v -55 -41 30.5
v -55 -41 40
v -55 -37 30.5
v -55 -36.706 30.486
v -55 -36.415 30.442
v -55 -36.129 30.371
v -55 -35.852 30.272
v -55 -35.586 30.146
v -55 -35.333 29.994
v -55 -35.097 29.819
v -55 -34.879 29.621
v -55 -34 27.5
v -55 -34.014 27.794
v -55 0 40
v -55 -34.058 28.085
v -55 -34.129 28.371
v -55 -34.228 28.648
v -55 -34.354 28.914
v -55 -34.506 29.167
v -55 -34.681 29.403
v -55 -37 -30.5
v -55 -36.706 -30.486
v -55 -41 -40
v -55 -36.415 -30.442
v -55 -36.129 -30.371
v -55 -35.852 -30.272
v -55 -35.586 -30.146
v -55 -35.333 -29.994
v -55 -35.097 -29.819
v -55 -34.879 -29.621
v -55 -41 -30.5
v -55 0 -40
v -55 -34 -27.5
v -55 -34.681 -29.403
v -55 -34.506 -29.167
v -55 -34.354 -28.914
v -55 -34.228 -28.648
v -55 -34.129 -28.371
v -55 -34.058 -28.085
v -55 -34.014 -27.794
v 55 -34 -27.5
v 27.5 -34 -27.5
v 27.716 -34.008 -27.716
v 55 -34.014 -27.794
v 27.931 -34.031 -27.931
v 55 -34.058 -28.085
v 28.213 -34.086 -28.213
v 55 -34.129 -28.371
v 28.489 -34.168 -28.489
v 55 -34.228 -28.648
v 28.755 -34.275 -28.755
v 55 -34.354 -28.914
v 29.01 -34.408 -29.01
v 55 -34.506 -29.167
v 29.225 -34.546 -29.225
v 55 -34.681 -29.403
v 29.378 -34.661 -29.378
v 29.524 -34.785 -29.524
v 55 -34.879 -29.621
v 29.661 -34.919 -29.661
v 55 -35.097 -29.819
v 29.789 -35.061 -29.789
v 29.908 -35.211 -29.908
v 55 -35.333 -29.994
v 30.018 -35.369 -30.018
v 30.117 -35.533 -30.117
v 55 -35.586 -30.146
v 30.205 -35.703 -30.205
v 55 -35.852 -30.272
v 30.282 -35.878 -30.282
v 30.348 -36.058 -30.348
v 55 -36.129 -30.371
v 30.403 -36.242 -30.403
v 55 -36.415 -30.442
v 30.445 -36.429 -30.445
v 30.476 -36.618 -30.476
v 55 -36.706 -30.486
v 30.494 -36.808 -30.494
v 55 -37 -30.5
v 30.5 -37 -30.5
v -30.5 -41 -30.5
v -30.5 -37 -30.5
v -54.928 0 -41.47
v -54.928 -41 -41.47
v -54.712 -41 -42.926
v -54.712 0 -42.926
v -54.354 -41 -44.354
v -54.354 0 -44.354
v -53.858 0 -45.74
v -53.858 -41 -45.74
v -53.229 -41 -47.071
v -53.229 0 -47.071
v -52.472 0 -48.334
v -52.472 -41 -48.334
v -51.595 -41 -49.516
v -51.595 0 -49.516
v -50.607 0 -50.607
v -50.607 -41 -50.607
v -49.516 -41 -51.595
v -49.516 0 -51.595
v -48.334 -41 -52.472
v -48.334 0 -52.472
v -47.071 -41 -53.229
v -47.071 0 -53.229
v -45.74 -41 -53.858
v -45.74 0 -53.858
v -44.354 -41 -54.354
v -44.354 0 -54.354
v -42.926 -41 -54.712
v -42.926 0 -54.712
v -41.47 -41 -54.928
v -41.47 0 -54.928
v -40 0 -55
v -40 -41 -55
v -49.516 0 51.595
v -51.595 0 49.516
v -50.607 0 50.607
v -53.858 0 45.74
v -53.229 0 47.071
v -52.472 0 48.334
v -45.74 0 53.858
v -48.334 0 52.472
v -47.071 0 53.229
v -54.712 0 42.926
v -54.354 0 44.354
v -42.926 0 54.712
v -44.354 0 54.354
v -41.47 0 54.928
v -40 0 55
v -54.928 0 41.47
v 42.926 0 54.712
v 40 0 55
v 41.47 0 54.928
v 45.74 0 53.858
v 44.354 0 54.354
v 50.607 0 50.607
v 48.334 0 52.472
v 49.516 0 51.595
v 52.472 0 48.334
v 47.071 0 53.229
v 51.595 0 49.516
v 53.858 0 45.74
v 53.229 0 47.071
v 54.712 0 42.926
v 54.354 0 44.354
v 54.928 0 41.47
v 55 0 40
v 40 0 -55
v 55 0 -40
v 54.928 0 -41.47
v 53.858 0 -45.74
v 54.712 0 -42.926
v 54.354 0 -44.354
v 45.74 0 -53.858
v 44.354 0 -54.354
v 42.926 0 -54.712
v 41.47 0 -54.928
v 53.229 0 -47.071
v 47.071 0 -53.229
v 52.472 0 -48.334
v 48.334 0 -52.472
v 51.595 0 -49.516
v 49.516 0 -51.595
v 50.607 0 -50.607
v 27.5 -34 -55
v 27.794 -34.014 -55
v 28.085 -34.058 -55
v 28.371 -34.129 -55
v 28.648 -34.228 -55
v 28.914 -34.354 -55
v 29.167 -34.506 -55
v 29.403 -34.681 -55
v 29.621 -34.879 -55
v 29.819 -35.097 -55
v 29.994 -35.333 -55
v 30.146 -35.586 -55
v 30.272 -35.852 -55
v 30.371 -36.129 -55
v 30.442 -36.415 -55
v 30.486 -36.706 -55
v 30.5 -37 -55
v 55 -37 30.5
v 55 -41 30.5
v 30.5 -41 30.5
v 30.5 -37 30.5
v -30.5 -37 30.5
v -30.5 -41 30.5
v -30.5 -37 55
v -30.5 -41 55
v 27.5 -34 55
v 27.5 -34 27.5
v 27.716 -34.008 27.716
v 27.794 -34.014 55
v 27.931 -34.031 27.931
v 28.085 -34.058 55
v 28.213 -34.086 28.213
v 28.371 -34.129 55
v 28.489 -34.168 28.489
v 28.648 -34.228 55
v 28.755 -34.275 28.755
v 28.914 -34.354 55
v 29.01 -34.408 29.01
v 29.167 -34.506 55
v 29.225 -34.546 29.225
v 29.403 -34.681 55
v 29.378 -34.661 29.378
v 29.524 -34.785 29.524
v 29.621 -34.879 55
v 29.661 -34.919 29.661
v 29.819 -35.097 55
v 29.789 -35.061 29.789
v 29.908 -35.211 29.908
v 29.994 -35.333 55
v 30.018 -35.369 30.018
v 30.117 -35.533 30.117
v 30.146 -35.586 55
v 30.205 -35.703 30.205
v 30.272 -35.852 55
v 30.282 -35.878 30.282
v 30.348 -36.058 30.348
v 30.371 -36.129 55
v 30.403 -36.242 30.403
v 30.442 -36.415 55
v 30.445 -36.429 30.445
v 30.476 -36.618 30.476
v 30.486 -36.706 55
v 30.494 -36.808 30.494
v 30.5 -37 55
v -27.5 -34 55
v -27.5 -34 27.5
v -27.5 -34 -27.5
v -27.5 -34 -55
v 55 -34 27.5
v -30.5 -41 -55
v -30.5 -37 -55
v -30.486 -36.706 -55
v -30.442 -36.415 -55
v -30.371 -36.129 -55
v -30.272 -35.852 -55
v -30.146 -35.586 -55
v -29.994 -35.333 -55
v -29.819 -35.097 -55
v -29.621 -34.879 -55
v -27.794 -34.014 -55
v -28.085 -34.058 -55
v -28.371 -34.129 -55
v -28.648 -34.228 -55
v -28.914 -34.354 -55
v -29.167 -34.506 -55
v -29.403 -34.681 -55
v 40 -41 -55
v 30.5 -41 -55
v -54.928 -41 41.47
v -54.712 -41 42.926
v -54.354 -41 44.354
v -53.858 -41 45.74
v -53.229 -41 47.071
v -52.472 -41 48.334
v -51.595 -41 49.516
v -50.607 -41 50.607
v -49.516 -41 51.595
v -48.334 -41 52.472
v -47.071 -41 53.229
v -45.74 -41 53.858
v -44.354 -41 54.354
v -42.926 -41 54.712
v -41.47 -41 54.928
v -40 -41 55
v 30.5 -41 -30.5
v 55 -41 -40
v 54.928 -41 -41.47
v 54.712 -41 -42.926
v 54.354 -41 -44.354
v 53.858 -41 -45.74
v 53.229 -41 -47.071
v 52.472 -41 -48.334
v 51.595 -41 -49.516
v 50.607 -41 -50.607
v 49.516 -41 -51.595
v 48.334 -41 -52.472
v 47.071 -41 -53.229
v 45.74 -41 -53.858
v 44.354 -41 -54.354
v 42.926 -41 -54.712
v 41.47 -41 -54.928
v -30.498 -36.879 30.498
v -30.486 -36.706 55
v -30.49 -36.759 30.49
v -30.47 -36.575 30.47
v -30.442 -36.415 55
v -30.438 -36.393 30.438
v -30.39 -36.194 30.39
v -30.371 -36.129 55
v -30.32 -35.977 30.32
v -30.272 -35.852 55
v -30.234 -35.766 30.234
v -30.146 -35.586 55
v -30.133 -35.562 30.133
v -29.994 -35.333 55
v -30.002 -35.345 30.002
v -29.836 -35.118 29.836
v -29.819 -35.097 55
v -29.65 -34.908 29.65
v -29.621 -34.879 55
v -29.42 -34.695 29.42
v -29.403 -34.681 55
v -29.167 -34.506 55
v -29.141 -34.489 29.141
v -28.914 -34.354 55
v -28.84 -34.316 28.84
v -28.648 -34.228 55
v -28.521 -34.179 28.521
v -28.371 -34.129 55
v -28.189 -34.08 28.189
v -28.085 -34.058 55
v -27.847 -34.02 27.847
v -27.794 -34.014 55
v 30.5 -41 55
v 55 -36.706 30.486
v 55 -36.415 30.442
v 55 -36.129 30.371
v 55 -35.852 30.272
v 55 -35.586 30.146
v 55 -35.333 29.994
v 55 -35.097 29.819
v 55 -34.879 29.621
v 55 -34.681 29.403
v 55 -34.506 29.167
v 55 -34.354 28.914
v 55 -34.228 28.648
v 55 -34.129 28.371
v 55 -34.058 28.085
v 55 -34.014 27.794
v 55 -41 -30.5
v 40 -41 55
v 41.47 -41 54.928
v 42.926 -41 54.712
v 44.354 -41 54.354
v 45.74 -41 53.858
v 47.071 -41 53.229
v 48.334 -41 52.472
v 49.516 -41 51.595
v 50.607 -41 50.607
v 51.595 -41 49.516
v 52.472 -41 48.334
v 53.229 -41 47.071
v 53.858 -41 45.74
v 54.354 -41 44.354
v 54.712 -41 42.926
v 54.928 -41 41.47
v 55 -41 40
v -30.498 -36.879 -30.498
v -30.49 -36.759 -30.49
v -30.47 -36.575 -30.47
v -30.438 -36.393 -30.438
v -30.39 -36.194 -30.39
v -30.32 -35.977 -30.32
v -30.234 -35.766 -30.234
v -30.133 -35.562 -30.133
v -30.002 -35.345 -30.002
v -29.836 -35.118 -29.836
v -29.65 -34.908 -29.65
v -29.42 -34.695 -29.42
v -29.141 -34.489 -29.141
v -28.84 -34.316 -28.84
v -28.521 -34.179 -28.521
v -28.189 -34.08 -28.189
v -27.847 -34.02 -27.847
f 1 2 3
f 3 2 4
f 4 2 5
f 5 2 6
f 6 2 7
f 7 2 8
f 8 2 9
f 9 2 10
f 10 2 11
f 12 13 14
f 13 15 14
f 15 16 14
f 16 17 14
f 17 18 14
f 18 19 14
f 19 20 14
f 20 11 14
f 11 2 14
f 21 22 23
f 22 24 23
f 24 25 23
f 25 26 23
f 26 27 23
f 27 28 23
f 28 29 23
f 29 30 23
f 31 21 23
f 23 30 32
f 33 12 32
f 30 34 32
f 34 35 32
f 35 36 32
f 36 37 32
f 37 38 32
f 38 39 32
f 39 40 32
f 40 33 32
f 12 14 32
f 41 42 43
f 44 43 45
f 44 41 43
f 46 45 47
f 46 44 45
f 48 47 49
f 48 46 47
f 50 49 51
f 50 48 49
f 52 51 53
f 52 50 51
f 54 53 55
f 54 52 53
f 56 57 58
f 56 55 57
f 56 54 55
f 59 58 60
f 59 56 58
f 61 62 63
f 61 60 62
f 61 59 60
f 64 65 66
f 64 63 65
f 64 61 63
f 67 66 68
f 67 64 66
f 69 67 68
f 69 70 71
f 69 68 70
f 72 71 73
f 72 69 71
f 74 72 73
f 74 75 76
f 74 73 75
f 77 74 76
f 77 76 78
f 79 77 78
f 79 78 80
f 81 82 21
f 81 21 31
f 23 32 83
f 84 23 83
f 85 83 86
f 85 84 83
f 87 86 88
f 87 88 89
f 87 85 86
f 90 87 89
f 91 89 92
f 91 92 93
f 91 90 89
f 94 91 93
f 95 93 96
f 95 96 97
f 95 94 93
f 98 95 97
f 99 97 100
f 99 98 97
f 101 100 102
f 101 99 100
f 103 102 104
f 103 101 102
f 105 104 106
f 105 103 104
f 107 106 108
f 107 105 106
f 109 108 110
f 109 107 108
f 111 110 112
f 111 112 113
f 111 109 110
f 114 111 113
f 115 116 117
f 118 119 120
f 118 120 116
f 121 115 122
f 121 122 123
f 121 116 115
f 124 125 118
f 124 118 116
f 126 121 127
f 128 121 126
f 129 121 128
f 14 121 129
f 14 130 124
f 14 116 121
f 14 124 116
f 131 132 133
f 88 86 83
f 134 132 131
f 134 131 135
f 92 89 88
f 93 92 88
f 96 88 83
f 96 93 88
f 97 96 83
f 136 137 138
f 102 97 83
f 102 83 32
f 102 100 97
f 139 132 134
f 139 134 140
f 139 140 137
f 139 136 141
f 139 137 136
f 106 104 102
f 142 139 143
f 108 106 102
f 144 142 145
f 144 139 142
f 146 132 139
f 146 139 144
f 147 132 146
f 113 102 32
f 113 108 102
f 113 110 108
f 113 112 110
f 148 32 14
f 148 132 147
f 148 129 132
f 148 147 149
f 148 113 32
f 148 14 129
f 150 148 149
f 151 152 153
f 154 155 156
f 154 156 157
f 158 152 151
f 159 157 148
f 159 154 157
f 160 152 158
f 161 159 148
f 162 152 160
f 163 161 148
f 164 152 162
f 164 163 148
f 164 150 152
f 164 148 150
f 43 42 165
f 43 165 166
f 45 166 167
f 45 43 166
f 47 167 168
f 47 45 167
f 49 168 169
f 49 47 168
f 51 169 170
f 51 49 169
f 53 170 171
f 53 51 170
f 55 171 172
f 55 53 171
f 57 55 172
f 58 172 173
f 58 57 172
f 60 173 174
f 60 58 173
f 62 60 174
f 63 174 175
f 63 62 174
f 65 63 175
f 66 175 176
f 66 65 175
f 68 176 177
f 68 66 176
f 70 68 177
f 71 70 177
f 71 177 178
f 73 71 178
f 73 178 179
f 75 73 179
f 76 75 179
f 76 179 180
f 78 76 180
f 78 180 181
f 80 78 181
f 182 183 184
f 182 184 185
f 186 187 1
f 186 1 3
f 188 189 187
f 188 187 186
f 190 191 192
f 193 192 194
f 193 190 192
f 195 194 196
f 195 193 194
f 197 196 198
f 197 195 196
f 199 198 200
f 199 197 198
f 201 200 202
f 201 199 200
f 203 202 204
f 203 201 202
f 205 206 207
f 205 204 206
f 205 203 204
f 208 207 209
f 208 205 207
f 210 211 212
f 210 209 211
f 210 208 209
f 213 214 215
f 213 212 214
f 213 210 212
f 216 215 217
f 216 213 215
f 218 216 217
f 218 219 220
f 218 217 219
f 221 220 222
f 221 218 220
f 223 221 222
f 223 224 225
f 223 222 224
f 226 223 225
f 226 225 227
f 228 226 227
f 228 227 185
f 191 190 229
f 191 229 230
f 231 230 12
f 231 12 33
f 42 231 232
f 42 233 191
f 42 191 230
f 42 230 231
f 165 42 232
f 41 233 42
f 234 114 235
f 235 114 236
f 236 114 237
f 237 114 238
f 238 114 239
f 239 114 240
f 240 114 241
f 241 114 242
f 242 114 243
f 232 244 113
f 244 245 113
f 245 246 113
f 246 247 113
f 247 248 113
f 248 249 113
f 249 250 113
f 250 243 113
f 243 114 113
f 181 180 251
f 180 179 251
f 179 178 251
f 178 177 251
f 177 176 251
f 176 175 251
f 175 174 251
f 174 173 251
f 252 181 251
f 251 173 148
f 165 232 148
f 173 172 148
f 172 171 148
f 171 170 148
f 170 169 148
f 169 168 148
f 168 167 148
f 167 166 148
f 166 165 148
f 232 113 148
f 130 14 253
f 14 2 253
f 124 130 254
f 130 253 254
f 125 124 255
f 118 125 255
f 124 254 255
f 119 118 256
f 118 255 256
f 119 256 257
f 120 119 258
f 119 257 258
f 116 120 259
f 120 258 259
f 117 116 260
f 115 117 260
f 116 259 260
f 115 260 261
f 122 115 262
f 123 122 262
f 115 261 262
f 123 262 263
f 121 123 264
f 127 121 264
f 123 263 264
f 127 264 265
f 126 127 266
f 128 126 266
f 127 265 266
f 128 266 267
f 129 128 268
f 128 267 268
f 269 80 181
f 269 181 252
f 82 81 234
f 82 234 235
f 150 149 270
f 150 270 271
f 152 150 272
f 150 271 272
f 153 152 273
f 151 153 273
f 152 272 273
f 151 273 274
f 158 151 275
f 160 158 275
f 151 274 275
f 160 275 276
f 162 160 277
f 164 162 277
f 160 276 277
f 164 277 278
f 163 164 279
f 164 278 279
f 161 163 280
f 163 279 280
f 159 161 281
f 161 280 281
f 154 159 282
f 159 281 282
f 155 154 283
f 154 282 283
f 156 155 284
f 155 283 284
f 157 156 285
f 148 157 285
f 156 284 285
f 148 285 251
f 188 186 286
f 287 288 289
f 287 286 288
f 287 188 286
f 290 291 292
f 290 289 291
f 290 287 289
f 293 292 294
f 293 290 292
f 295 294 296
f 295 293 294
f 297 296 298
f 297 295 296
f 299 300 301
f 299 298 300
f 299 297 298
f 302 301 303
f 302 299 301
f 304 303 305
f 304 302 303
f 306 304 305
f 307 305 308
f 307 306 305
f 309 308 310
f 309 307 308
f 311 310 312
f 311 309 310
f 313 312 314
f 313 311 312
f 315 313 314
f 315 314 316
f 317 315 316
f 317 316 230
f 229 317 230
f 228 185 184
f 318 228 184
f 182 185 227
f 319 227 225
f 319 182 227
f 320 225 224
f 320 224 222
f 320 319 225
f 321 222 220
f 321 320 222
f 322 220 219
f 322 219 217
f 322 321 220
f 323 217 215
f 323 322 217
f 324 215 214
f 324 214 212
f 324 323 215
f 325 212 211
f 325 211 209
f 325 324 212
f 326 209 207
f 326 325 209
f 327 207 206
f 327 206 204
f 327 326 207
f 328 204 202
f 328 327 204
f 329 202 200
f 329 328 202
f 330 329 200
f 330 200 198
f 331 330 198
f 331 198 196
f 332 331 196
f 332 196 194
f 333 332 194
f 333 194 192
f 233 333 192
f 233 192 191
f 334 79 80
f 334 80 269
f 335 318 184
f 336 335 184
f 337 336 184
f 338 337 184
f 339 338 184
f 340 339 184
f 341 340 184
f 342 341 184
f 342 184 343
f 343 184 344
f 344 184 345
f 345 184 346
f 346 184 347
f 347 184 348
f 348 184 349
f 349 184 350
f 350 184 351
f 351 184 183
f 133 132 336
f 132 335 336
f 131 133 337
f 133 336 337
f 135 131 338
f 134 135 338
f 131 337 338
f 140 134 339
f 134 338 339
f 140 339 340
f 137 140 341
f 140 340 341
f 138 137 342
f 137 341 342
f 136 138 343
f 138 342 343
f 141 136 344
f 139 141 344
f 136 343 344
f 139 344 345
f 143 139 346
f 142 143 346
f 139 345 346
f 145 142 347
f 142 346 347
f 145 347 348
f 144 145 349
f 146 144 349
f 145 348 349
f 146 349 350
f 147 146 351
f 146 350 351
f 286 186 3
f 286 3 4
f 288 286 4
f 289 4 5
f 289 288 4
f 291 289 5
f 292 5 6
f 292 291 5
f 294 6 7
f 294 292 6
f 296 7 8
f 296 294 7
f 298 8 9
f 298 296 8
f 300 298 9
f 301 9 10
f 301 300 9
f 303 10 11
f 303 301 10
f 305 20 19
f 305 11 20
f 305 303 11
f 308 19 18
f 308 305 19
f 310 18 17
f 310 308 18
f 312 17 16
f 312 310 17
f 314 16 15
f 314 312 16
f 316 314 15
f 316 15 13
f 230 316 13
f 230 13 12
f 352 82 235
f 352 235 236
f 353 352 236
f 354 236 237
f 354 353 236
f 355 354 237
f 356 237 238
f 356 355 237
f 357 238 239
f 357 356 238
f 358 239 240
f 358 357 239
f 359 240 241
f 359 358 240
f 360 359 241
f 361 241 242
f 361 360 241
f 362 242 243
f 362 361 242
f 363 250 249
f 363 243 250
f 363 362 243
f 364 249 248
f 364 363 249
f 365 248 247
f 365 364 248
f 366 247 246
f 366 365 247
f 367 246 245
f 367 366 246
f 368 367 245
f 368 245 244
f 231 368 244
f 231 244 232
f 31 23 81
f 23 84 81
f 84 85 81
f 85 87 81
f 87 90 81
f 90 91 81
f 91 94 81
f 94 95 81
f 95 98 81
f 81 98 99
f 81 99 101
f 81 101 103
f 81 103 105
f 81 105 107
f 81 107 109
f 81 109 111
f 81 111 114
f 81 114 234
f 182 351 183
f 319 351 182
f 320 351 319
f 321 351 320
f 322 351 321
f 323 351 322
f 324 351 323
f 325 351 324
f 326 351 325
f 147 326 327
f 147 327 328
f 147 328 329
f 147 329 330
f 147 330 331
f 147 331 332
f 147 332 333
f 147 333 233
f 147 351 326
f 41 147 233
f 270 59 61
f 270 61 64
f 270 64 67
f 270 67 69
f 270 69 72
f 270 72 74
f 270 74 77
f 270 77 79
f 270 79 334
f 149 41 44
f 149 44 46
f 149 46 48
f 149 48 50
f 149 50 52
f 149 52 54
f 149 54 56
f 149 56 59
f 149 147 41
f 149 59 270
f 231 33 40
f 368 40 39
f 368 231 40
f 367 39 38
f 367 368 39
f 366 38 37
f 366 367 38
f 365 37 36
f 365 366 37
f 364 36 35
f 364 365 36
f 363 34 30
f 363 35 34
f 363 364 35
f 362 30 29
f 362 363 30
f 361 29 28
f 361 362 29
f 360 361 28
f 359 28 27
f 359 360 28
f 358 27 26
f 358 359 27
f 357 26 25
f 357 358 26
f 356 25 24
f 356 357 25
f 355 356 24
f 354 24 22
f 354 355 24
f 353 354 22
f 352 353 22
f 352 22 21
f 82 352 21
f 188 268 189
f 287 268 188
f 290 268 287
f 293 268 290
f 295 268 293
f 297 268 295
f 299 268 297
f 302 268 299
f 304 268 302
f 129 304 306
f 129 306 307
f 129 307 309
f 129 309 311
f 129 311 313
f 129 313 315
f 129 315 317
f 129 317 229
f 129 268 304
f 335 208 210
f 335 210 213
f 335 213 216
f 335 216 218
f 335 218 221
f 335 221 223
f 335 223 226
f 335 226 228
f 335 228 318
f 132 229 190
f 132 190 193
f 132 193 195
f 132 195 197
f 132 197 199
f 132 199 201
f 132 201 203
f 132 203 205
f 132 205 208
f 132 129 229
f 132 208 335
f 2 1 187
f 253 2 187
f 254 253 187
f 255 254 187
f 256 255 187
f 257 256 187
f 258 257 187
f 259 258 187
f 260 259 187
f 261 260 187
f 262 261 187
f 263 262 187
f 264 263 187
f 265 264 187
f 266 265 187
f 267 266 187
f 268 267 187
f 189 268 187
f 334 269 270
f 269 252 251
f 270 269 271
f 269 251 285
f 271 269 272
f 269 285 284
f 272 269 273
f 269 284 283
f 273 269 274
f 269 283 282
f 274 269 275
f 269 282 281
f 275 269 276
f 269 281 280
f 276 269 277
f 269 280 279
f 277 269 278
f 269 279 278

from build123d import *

# Parameters (mm, degrees)
SKIZZE1_W                       = 110
SKIZZE1_H                       = 110
AUFSATZ_LINEAR_AUSTRAGEN1_DEPTH = 41
VERRUNDUNG1_R                   = 15
SCHNITT_LINEAR_AUSTRAGEN1_DEPTH = 111
KREISMUSTER1_COUNT              = 2
KREISMUSTER1_ANGLE              = 90


with BuildPart() as part:
    # Skizze1 → Aufsatz-Linear austragen1 (new body)
    with BuildSketch(Plane(origin=(0, 0, 0), x_dir=(1, 0, 0), z_dir=(0, 1, 0))):
        Rectangle(SKIZZE1_W, SKIZZE1_H)
    extrude(amount=-AUFSATZ_LINEAR_AUSTRAGEN1_DEPTH)

    # Verrundung1
    verrundung1_edges = [part.edges().sort_by_distance(p)[0] for p in [
        (55, -20.5, 55),
        (-55, -20.5, 55),
        (-55, -20.5, -55),
        (55, -20.5, -55),
    ]]
    fillet(verrundung1_edges, radius=VERRUNDUNG1_R)

    # Skizze2 → Schnitt-Linear austragen1 (cut, through all)
    with BuildSketch(Plane.XY.offset(55)):
        with BuildLine():
            Line((-30.5, -41), (-30.5, -37))
            ThreePointArc((-30.5, -37), (-29.621320344, -34.878679656), (-27.5, -34))
            Line((-27.5, -34), (27.5, -34))
            ThreePointArc((27.5, -34), (29.621320344, -34.878679656), (30.5, -37))
            Line((30.5, -37), (30.5, -41))
            Line((30.5, -41), (-30.5, -41))
        make_face()
    schnitt_linear_austragen1 = extrude(amount=-SCHNITT_LINEAR_AUSTRAGEN1_DEPTH, mode=Mode.SUBTRACT)

    # Kreismuster1: Schnitt-Linear austragen1 ×2 about axis
    kreismuster1_axis = Axis((0, -43.05, 0), (0, 1, 0))
    for i in range(1, KREISMUSTER1_COUNT):
        add(schnitt_linear_austragen1.rotate(kreismuster1_axis, i * KREISMUSTER1_ANGLE / (KREISMUSTER1_COUNT - 1)), mode=Mode.SUBTRACT)


solid = part.part
